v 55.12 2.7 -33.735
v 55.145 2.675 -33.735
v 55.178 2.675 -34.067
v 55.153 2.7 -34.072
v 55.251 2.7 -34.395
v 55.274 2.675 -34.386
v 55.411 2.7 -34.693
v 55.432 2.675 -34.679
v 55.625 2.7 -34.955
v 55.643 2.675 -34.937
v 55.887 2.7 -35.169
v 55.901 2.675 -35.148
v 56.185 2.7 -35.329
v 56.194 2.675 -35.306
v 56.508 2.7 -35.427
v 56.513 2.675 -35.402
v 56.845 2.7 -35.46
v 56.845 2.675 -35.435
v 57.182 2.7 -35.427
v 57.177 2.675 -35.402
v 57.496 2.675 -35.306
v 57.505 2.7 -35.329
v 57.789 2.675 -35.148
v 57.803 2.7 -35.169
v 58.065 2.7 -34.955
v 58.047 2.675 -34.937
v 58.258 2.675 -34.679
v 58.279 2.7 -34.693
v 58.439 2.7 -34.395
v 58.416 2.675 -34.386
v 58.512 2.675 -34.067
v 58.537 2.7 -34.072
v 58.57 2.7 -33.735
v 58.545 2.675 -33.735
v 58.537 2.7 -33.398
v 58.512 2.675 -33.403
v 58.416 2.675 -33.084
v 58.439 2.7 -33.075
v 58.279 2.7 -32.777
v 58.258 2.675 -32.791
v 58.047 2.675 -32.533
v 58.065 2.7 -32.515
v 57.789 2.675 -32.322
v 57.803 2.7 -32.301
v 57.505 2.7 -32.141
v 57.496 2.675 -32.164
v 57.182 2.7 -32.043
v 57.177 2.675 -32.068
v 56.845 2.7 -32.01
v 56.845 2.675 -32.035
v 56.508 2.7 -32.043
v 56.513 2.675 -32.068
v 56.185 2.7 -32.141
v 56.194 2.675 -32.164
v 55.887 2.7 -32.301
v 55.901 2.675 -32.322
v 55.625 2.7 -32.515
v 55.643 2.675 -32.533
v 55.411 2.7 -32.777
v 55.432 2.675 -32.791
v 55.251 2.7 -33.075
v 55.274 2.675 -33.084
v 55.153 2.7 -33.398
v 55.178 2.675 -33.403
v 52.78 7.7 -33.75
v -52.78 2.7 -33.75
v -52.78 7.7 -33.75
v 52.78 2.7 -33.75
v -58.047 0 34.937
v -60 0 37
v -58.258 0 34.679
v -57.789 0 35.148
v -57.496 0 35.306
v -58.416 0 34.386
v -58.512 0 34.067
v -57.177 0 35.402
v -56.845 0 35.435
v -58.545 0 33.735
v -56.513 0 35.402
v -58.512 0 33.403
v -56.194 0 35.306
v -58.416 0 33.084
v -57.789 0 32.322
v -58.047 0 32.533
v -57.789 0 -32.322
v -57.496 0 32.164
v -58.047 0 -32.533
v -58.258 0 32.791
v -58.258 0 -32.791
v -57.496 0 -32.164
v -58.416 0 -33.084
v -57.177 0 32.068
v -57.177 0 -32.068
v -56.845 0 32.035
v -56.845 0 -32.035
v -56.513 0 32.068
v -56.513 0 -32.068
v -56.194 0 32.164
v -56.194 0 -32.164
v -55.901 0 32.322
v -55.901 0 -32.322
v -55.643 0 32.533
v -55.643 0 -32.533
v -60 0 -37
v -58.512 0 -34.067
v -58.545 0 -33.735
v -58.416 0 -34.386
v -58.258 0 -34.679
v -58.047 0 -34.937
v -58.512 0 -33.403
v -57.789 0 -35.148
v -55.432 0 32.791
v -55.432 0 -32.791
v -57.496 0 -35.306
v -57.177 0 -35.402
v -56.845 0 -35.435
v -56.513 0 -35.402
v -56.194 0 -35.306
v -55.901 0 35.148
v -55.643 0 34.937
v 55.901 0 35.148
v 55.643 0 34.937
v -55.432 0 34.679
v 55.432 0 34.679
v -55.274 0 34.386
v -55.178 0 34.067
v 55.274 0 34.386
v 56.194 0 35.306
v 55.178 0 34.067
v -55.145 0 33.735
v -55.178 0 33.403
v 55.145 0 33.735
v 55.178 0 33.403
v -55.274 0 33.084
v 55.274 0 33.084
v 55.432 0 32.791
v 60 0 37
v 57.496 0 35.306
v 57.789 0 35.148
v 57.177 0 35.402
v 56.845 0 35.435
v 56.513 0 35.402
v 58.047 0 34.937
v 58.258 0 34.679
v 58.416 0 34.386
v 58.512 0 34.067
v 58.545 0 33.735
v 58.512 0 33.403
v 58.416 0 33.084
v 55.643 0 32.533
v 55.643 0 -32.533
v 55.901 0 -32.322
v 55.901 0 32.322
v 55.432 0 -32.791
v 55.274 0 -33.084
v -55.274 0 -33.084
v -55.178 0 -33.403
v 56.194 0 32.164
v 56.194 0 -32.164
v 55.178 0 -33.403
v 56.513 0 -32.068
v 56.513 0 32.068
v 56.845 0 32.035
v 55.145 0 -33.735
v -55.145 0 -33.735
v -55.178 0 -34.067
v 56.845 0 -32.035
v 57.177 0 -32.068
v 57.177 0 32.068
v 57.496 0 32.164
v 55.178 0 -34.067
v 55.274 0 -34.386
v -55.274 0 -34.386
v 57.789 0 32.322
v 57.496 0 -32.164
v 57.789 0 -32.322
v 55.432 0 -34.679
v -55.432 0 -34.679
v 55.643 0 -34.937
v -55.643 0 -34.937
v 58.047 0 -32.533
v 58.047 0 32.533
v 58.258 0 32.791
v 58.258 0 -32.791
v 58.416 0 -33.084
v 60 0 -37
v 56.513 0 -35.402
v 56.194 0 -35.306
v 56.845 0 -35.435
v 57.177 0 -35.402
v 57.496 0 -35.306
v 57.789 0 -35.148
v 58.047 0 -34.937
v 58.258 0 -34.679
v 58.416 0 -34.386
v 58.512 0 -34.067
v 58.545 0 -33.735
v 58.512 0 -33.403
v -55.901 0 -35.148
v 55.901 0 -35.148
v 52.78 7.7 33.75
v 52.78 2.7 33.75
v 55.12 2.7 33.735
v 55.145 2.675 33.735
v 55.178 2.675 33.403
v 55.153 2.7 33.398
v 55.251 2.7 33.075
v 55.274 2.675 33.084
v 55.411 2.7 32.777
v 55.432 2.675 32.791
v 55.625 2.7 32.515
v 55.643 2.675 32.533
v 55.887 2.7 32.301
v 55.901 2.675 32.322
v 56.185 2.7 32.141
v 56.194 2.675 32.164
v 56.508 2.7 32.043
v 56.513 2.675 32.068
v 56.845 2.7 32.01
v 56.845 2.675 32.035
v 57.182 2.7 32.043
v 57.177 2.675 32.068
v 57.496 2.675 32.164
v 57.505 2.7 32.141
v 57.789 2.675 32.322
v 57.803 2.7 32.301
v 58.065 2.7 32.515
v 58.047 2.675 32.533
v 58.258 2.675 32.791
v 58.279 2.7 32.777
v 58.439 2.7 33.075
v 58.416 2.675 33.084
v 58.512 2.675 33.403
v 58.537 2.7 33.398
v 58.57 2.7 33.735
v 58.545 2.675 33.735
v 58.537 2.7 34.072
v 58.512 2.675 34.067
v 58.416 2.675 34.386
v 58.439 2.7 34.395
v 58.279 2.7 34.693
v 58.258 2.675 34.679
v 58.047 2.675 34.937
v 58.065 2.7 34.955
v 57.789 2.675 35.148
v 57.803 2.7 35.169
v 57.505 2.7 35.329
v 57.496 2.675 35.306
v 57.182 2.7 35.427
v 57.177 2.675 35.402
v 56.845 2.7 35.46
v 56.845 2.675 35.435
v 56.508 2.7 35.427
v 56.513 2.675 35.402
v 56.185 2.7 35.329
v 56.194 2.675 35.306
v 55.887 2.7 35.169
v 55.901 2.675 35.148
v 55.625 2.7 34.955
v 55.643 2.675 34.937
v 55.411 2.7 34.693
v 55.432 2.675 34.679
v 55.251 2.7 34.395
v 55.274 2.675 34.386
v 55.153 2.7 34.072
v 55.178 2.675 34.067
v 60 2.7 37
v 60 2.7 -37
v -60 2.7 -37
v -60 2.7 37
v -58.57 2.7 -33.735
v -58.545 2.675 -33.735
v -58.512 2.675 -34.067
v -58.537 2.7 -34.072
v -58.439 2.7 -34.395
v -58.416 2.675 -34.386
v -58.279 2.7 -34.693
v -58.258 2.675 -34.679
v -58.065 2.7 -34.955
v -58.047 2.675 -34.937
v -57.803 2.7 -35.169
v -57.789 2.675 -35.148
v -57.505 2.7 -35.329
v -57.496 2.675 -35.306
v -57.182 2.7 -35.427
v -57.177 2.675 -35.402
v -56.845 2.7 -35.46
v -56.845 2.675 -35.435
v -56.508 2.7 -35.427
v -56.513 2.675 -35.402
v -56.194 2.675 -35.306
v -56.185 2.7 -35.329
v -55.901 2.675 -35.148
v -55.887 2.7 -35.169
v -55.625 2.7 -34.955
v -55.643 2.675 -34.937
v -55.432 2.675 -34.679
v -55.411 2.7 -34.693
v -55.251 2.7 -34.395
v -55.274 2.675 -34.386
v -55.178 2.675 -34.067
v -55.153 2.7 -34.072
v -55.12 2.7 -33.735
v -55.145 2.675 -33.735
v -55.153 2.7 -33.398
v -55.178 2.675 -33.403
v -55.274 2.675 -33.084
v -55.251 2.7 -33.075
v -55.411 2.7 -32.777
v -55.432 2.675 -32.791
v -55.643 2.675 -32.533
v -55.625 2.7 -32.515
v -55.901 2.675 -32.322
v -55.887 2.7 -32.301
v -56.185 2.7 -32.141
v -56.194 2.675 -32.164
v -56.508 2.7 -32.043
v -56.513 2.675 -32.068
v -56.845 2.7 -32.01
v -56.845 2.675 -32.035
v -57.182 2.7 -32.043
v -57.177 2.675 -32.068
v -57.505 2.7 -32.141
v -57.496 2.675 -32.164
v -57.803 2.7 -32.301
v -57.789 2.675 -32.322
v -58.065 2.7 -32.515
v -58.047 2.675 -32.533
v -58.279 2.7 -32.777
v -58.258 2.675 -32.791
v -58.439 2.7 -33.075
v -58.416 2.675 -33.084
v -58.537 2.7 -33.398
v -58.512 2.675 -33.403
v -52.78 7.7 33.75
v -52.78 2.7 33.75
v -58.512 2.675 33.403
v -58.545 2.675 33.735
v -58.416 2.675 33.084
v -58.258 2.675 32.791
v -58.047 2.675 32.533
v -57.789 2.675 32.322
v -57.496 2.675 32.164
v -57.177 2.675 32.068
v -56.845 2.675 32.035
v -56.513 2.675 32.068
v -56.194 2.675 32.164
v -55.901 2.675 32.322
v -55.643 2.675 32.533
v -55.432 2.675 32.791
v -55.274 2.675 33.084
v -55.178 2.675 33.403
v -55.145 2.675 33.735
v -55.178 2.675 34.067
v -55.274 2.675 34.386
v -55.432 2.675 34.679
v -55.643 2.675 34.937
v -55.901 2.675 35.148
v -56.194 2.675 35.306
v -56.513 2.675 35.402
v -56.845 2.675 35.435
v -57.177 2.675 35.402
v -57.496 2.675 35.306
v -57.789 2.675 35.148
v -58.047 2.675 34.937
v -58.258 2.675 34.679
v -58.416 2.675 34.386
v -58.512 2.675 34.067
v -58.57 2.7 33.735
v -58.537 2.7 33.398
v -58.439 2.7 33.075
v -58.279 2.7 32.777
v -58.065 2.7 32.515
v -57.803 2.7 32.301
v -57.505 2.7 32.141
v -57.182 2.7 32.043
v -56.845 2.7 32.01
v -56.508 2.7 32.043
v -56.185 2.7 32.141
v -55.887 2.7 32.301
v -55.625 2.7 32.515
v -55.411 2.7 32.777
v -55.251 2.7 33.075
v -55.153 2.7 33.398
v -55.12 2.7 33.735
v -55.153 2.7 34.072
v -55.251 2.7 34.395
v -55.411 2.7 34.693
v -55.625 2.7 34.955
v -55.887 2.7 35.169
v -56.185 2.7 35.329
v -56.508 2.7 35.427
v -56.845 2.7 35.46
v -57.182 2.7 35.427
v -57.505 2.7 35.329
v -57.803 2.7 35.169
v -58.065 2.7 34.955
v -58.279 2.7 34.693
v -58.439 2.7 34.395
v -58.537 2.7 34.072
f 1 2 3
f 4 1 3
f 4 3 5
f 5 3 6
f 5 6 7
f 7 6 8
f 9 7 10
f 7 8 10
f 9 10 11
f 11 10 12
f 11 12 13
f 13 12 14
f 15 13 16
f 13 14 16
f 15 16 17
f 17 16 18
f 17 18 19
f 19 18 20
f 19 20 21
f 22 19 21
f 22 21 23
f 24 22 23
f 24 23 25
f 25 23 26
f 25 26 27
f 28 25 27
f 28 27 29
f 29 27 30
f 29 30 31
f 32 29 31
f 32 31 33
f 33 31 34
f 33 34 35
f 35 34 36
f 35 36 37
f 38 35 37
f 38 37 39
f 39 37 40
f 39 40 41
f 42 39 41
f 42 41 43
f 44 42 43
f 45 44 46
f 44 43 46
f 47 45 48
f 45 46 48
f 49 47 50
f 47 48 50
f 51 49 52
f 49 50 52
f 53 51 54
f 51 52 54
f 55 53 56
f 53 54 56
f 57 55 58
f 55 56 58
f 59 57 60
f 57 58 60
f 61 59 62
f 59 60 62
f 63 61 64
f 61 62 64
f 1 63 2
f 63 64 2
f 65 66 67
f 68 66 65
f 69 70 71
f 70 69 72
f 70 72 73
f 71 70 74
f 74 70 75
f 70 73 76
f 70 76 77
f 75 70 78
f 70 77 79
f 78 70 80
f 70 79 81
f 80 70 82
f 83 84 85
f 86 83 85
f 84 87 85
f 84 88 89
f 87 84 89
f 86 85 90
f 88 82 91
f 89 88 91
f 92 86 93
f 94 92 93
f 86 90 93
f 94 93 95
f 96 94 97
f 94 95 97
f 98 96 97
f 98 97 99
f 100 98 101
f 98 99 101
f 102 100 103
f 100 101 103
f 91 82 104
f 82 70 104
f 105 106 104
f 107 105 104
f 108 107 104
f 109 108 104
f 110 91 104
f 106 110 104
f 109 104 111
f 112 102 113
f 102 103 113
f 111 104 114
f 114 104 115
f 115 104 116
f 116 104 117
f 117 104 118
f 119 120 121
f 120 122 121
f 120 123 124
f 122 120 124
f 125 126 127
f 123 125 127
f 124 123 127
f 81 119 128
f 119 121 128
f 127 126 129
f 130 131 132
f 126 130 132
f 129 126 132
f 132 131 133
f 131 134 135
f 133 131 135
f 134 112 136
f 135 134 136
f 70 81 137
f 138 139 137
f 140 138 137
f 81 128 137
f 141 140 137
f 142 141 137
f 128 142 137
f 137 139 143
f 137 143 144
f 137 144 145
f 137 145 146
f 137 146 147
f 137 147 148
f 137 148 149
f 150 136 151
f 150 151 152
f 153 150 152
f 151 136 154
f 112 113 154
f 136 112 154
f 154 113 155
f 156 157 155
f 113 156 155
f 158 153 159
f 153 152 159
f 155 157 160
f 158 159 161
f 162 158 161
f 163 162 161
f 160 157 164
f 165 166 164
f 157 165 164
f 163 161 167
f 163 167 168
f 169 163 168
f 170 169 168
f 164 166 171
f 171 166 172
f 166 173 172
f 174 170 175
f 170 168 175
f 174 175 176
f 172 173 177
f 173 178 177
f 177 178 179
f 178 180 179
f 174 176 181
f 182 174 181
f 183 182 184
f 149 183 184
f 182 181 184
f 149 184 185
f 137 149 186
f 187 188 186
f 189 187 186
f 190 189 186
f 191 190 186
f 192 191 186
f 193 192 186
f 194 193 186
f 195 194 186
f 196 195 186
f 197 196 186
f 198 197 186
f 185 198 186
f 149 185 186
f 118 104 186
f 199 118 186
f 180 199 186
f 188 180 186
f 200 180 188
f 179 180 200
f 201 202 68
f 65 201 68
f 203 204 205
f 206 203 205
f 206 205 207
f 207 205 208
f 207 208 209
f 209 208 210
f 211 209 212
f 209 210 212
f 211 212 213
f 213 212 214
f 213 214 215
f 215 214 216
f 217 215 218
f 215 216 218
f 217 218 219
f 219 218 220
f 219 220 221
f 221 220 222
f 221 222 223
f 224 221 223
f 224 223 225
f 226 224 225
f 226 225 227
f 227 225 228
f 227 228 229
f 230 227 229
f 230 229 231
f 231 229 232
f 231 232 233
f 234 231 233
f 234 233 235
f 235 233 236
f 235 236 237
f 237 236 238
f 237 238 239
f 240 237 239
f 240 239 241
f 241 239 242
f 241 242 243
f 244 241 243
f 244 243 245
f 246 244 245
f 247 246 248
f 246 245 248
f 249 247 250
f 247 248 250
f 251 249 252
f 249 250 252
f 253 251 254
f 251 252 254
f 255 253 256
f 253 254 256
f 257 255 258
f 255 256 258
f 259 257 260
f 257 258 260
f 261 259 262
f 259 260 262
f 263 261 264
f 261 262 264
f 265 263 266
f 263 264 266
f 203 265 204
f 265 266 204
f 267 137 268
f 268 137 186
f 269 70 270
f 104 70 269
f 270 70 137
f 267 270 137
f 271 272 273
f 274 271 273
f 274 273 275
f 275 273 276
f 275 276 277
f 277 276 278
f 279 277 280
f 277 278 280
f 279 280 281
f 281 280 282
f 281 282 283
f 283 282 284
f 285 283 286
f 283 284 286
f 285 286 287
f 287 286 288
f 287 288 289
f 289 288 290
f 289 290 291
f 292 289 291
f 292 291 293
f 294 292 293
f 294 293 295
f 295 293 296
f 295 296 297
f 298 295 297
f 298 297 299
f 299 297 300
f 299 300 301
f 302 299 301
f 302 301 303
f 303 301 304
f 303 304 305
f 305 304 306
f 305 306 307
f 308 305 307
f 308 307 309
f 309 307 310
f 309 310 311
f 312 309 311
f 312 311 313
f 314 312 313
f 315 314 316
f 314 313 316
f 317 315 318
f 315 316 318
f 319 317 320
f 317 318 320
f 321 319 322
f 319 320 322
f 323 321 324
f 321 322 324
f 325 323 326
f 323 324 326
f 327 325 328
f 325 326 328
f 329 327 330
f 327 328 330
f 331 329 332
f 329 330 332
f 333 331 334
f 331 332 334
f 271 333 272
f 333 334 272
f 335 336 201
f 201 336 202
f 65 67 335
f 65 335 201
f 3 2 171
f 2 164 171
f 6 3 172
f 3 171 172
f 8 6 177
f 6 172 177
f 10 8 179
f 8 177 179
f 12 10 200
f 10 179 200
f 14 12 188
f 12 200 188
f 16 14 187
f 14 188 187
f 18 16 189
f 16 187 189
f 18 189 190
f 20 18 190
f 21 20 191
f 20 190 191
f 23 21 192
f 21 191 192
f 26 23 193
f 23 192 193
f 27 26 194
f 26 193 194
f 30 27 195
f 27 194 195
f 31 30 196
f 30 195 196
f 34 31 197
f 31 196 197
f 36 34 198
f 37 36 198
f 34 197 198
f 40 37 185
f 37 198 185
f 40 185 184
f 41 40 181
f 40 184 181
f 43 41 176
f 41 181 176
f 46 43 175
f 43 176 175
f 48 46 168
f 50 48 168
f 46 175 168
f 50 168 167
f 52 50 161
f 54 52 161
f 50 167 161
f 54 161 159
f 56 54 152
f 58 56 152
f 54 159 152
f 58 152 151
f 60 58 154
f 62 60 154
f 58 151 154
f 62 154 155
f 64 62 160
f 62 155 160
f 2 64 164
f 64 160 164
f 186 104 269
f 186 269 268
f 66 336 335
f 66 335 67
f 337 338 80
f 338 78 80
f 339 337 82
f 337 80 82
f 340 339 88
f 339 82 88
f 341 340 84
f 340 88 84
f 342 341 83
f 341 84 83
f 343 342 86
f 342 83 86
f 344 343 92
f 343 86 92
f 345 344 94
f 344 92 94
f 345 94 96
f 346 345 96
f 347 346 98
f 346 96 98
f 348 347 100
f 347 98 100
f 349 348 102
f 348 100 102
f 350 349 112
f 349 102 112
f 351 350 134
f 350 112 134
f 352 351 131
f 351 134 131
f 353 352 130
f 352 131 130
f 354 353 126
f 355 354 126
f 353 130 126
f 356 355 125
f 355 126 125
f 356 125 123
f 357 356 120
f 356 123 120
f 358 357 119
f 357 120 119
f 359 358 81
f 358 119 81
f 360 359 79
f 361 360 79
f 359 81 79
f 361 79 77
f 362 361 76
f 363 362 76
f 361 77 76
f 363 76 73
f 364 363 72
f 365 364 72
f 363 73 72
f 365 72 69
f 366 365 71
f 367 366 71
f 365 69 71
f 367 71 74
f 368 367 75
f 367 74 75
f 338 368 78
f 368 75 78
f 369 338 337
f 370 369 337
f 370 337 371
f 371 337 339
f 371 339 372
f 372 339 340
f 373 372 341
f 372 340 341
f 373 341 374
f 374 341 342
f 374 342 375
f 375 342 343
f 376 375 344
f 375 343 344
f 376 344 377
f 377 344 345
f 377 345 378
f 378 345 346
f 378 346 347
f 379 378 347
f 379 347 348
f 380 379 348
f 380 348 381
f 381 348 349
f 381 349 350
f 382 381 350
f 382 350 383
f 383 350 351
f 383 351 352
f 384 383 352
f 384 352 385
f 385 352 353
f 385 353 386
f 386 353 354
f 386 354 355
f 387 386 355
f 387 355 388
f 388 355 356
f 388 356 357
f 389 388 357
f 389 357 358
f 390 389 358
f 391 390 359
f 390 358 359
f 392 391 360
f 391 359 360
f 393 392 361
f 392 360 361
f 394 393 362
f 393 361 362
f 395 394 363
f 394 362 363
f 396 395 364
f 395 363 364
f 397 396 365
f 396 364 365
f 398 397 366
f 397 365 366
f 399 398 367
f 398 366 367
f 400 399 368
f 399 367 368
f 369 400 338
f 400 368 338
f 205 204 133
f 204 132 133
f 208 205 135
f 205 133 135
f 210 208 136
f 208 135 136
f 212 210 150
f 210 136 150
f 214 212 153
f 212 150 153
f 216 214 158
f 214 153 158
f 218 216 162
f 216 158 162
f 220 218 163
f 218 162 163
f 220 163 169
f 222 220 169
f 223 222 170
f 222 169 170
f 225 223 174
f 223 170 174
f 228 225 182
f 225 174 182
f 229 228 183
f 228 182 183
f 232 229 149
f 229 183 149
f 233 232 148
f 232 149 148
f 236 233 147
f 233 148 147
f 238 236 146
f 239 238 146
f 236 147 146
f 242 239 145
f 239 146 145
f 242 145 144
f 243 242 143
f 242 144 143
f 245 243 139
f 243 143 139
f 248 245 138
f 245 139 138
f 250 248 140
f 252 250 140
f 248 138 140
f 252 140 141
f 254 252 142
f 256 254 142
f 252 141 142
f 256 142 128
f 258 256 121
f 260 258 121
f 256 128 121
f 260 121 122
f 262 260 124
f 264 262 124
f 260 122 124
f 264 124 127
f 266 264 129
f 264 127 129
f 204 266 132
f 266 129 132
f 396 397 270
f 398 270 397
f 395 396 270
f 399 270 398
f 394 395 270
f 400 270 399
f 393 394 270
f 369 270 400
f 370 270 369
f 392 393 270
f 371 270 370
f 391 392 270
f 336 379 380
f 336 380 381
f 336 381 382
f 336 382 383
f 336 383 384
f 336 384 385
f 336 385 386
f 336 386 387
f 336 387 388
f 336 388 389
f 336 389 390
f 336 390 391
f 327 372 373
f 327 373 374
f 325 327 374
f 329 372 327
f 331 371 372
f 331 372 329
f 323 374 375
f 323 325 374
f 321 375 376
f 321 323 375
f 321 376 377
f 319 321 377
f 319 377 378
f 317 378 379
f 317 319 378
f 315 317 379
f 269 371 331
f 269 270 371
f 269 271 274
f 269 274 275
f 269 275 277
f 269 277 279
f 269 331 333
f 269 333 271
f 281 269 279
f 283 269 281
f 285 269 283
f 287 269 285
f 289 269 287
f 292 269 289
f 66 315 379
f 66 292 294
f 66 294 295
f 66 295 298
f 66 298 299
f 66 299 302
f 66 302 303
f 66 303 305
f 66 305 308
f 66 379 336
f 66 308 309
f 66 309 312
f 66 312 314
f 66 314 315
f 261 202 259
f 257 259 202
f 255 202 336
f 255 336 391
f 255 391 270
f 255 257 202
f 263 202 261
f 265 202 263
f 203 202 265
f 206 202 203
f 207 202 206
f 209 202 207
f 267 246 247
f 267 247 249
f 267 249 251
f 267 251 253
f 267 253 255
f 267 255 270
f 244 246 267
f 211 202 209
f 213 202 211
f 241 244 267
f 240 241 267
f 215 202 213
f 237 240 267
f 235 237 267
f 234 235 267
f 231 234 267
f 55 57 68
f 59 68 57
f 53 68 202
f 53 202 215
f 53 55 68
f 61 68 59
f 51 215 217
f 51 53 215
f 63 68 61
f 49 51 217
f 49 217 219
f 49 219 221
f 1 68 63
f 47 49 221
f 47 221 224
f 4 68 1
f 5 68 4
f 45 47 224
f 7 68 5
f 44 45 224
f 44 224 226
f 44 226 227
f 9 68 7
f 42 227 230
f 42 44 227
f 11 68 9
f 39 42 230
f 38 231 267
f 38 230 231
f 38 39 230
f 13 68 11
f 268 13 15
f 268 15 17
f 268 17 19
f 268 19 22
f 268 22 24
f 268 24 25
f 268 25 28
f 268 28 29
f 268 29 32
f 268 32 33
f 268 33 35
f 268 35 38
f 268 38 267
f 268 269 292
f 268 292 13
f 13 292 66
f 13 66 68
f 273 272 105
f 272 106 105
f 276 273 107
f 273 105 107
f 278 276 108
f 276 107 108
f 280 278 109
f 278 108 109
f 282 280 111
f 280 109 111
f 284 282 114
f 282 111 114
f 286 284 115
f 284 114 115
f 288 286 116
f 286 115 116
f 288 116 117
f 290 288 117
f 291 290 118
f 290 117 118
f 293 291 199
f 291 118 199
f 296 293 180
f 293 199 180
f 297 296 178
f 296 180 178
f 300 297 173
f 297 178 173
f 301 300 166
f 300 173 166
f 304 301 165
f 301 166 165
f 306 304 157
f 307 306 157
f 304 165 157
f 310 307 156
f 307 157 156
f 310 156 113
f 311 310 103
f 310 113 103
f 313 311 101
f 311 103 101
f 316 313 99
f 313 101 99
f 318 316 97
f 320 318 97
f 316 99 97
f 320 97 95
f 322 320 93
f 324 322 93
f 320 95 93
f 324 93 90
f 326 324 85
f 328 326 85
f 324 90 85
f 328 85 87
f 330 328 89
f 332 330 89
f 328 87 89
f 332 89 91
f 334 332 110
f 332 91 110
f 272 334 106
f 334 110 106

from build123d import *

# Parameters (mm, degrees)
SKETCH1_W                      = 120
SKETCH1_H                      = 74
BOSS_EXTRUDE1_DEPTH            = 2.7
SKETCH2_W                      = 105.56
SKETCH2_H                      = 67.5
BOSS_EXTRUDE2_DEPTH            = 5
M3_CLEARANCE_HOLE1_D           = 3.4
M3_CLEARANCE_HOLE1_CSINK_D     = 3.45
M3_CLEARANCE_HOLE1_CSINK_ANGLE = 90


with BuildPart() as part:
    # Sketch1 → Boss-Extrude1 (new body)
    with BuildSketch(Plane(origin=(0, 0, 0), x_dir=(1, 0, 0), z_dir=(0, 1, 0))):
        Rectangle(SKETCH1_W, SKETCH1_H)
    extrude(amount=BOSS_EXTRUDE1_DEPTH)

    # Sketch2 → Boss-Extrude2 (add)
    with BuildSketch(Plane(origin=(0, 2.7, 0), x_dir=(1, 0, 0), z_dir=(0, 1, 0))):
        Rectangle(SKETCH2_W, SKETCH2_H)
    extrude(amount=BOSS_EXTRUDE2_DEPTH)

    # M3 Clearance Hole1 (through all)
    with Locations(Plane(origin=(0, 2.7, 0), x_dir=(1, 0, 0), z_dir=(0, 1, 0))):
        with Locations((-56.845, 33.735), (56.845, 33.735), (56.845, -33.735), (-56.845, -33.735)):
            CounterSinkHole(M3_CLEARANCE_HOLE1_D / 2, M3_CLEARANCE_HOLE1_CSINK_D / 2, counter_sink_angle=M3_CLEARANCE_HOLE1_CSINK_ANGLE)


solid = part.part
